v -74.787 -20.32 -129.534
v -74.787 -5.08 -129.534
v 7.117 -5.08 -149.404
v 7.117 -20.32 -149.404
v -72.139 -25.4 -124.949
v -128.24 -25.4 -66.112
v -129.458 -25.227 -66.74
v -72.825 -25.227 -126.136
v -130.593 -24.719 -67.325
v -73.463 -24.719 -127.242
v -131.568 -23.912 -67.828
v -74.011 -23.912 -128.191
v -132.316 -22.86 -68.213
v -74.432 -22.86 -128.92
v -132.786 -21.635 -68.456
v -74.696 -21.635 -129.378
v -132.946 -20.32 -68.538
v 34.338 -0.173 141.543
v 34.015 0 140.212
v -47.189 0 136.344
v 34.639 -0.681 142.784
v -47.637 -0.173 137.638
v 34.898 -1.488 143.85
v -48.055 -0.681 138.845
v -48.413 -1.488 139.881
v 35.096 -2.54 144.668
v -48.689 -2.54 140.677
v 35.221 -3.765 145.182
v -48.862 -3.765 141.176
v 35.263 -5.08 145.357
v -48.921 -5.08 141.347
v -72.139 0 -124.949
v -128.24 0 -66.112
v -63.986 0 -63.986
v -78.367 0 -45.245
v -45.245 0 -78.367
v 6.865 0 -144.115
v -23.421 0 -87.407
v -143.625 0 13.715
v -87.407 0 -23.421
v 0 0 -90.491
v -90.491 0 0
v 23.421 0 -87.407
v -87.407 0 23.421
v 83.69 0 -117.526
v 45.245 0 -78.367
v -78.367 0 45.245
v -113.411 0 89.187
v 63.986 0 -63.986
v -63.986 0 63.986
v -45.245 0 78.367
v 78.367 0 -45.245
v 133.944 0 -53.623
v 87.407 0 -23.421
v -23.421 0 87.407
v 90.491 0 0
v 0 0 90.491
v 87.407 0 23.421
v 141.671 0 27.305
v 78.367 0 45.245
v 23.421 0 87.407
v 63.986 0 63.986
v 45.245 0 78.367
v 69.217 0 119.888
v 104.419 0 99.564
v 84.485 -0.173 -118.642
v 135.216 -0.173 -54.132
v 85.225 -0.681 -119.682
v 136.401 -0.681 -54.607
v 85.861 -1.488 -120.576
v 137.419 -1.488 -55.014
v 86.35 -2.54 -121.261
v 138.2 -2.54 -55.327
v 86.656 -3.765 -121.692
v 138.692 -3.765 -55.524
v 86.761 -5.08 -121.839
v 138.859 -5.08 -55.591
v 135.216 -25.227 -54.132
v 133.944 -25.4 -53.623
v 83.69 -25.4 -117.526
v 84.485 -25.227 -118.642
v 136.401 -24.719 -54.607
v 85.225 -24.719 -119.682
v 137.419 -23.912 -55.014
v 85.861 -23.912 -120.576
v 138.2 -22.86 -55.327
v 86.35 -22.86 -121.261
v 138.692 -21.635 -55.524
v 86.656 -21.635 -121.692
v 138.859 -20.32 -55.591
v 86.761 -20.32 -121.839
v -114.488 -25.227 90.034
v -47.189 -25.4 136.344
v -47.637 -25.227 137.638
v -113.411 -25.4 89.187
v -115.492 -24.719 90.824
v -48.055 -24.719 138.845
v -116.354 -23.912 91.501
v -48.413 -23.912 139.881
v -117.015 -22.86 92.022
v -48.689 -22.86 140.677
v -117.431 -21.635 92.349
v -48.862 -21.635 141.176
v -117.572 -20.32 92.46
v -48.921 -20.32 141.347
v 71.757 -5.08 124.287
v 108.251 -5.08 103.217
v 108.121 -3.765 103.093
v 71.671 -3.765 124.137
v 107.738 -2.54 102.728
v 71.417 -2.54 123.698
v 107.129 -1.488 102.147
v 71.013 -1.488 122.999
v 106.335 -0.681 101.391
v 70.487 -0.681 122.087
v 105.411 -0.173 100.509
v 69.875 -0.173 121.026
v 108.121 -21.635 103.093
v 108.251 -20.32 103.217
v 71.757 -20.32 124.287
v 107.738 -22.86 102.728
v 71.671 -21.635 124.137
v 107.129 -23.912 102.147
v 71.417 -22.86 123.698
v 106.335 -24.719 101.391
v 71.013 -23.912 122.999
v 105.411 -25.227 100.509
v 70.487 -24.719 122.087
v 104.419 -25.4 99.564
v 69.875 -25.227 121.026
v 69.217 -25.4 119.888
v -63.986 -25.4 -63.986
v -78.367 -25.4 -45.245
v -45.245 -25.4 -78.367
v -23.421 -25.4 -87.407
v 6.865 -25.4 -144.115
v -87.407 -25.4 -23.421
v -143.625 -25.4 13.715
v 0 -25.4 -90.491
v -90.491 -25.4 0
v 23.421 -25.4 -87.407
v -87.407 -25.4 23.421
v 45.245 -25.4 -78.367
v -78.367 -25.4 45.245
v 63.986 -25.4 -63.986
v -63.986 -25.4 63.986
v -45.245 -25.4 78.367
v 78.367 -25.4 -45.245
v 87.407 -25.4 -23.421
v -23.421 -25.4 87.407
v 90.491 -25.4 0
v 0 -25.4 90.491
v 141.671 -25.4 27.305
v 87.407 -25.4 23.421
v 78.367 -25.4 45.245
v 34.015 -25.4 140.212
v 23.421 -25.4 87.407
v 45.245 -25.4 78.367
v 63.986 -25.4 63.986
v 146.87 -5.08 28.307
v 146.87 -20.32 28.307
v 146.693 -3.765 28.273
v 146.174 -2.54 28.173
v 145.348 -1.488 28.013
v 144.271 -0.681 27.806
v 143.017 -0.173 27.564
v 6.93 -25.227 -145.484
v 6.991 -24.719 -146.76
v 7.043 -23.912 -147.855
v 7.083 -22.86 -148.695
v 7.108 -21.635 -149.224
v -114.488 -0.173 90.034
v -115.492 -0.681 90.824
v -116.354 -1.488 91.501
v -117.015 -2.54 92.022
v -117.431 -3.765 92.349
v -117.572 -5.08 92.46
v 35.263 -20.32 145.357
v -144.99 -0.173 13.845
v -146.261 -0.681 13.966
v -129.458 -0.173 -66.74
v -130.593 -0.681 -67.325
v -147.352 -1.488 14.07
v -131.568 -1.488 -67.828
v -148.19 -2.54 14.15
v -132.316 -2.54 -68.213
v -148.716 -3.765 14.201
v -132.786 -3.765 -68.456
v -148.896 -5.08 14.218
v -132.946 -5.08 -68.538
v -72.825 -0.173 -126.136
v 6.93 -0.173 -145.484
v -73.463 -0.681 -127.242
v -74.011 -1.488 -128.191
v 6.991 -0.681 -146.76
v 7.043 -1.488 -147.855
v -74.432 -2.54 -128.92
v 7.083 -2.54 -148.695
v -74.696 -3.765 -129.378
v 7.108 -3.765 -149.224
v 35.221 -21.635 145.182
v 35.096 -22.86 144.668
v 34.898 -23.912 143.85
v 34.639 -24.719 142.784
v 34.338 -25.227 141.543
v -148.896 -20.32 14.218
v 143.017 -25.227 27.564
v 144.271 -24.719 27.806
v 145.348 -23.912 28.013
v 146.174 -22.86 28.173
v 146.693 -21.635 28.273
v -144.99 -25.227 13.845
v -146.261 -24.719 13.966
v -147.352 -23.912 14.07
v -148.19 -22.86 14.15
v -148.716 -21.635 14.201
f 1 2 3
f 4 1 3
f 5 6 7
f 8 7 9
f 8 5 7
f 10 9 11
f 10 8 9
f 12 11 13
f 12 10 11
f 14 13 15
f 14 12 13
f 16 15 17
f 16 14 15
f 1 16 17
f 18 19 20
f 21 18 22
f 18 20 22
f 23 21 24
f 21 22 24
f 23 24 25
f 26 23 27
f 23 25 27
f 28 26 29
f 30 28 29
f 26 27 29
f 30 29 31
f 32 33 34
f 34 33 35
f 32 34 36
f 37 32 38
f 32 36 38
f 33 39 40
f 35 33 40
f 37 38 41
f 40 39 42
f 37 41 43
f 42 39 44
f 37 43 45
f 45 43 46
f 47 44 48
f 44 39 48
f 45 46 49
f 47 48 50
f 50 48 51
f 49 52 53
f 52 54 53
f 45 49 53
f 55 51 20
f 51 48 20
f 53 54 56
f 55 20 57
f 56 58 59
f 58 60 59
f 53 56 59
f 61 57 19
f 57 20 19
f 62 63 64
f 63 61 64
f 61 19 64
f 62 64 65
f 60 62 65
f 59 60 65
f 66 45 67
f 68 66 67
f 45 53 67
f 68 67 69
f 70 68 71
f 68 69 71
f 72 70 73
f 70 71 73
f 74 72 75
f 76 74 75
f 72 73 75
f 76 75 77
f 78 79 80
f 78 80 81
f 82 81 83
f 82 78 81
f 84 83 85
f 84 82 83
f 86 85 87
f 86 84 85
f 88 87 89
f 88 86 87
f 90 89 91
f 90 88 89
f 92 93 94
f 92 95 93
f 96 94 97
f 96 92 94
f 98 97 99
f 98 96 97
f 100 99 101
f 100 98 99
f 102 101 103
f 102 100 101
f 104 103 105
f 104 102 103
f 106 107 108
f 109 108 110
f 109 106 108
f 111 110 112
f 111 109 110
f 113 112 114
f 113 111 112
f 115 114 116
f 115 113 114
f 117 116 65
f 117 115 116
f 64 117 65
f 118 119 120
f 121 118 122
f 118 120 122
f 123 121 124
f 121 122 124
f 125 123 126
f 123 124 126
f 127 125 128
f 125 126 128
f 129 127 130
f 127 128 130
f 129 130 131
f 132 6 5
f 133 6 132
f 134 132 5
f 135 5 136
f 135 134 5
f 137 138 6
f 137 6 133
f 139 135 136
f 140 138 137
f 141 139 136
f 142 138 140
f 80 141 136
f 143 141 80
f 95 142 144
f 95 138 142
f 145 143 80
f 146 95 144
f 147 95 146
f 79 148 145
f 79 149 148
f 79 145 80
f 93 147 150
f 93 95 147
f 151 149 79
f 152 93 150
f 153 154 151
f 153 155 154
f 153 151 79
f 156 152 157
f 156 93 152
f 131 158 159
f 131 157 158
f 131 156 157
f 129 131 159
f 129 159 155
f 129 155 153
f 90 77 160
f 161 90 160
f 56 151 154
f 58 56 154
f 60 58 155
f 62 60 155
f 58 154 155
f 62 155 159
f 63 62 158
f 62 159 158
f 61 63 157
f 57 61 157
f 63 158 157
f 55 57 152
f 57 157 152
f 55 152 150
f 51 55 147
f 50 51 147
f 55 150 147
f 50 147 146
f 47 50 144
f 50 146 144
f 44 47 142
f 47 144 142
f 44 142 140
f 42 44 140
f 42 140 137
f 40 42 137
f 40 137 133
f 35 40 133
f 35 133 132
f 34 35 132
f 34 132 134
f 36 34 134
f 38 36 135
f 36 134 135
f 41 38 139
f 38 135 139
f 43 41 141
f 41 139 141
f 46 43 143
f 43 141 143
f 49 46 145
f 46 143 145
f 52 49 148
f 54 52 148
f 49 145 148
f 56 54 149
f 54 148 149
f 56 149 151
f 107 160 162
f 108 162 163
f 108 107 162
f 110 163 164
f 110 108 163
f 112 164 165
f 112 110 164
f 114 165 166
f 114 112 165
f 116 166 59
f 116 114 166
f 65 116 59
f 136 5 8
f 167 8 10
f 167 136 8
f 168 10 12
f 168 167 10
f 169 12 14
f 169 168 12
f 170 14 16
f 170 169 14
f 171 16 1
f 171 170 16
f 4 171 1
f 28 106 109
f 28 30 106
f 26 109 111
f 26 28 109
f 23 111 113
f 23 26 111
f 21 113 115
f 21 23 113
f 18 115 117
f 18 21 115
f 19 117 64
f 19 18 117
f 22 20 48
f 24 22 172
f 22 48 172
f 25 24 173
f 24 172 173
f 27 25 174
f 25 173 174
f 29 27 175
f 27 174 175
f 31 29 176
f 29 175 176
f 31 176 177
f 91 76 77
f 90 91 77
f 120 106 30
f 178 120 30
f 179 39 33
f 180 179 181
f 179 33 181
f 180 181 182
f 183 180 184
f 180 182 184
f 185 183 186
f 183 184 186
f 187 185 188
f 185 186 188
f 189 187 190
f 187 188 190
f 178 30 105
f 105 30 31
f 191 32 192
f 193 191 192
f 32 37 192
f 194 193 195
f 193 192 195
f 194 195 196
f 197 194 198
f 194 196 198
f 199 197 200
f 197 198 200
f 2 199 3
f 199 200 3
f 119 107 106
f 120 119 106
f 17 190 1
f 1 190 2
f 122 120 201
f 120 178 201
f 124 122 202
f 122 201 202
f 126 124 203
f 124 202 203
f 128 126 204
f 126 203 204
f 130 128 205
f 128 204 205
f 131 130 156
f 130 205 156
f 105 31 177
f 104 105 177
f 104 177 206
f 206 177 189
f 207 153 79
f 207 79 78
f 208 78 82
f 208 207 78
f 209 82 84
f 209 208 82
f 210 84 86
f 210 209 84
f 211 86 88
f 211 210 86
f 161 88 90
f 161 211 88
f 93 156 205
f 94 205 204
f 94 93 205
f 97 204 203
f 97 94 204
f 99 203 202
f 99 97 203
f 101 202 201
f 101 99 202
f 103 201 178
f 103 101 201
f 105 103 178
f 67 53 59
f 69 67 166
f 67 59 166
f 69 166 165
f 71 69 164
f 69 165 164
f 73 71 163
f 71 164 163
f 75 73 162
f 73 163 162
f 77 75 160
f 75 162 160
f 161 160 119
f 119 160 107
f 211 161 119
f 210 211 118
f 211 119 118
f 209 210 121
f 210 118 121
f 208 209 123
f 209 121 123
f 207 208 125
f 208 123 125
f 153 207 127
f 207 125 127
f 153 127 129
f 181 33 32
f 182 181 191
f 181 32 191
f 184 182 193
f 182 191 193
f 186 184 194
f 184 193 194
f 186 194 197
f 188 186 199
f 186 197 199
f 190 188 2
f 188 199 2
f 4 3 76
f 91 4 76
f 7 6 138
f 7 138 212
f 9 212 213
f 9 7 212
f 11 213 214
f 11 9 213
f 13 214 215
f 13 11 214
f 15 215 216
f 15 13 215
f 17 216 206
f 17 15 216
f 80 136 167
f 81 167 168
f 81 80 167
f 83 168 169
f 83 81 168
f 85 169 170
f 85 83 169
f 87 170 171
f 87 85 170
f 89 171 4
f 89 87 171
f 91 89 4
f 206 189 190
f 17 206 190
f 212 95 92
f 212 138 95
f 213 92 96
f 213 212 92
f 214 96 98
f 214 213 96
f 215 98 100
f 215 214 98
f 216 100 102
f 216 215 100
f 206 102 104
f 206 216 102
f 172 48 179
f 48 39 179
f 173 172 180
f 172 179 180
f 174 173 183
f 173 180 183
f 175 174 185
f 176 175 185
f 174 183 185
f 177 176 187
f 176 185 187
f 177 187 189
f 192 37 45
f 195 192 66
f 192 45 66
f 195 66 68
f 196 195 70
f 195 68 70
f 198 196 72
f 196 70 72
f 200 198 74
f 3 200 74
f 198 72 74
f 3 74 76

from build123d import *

# Parameters (mm, degrees)
F1_DEPTH = 25.4
F2_R     = 90.4905202305
F3_DEPTH = 25.4
F4_R     = 5.08
F5_R     = 5.08


with BuildPart() as f1:
    # F0 (on Front) → F1 (new body)
    with BuildSketch(Plane.XZ):
        Polygon((108.2512310565, 103.2173403296), (71.7572271824, 124.2871632902), (35.2632233082, 145.3569862507), (-48.9206086824, 141.3468160806), (-117.5724930729, 92.4600305138), (-148.8959416402, 14.2178385502), (-132.9459807853, -68.5384166946), (-74.7866103824, -129.5342089082), (7.1169803999, -149.4038050384), (86.7609801915, -121.8387487058), (138.858981796, -55.5907505305), (146.870237811, 28.3069181527), align=None)
        Polygon((-16.0764054761, 73.5763918309), (71.7572271824, 124.2871632902), (71.7572271824, 25.0510078709), (72.8934520967, 23.3153364586), (71.7572271824, 0), (71.7572271824, -124.2871632902), (-143.5144543648, 0), (-52.9619502577, 52.280512622), (-41.3737298926, 66.6985122387), align=None, mode=Mode.SUBTRACT)
        Polygon((71.7572271824, -124.2871632902), (71.7572271824, 0), (70.6210022681, -23.3153364586), (41.3737298926, -59.7046308119), (-3.6769010605, -71.953072985), (-47.3230807818, -55.3821743769), (-72.8934520967, -16.3214550319), (-70.6210022681, 30.3092178854), (-52.9619502577, 52.280512622), (-143.5144543648, 0), align=None)
        Polygon((71.7572271824, 25.0510078709), (71.7572271824, 124.2871632902), (-16.0764054761, 73.5763918309), (3.6769010605, 78.9469544117), (47.3230807818, 62.3760558037), align=None)
        Polygon((-52.9619502577, 52.280512622), (-16.0764054761, 73.5763918309), (-41.3737298926, 66.6985122387), align=None)
    extrude(amount=F1_DEPTH)

    # F2 (on face) → F3 (cut)
    with BuildSketch(Plane.XZ.offset(25.4)):
        Circle(F2_R)
        Polygon((72.8934520967, 23.3153364586), (70.6210022681, -23.3153364586), (41.3737298926, -59.7046308119), (-3.6769010605, -71.953072985), (-47.3230807818, -55.3821743769), (-72.8934520967, -16.3214550319), (-70.6210022681, 30.3092178854), (-52.9619502577, 52.280512622), (-16.0764054761, 73.5763918309), (3.6769010605, 78.9469544117), (47.3230807818, 62.3760558037), align=None, mode=Mode.SUBTRACT)
    extrude(amount=-F3_DEPTH, mode=Mode.SUBTRACT)

    # F4
    f4_edges = [f1.edges().sort_by_distance(p)[0] for p in [
        (-133.234217, -25.4, 53.338935),
        (-140.920961, -25.4, -27.160289),
        (-103.866296, -25.4, -99.036313),
        (-33.834815, -25.4, -139.469007),
        (46.93898, -25.4, -135.621277),
        (112.809981, -25.4, -88.71475),
        (142.86461, -25.4, -13.641916),
        (127.560734, -25.4, 65.762129),
        (71.757227, -25.4, 124.287163),
        (-6.828693, -25.4, 143.351901),
        (-83.246551, -25.4, 116.903423),
    ]]
    fillet(f4_edges, radius=F4_R)

    # F5
    f5_edges = [f1.edges().sort_by_distance(p)[0] for p in [
        (127.560734, 0, 65.762129),
        (142.86461, 0, -13.641916),
        (112.809981, 0, -88.71475),
        (46.93898, 0, -135.621277),
        (-33.834815, 0, -139.469007),
        (-103.866296, 0, -99.036313),
        (-140.920961, 0, -27.160289),
        (-6.828693, 0, 143.351901),
        (71.757227, 0, 124.287163),
        (-83.246551, 0, 116.903423),
        (-133.234217, 0, 53.338935),
    ]]
    fillet(f5_edges, radius=F5_R)


solid = f1.part
